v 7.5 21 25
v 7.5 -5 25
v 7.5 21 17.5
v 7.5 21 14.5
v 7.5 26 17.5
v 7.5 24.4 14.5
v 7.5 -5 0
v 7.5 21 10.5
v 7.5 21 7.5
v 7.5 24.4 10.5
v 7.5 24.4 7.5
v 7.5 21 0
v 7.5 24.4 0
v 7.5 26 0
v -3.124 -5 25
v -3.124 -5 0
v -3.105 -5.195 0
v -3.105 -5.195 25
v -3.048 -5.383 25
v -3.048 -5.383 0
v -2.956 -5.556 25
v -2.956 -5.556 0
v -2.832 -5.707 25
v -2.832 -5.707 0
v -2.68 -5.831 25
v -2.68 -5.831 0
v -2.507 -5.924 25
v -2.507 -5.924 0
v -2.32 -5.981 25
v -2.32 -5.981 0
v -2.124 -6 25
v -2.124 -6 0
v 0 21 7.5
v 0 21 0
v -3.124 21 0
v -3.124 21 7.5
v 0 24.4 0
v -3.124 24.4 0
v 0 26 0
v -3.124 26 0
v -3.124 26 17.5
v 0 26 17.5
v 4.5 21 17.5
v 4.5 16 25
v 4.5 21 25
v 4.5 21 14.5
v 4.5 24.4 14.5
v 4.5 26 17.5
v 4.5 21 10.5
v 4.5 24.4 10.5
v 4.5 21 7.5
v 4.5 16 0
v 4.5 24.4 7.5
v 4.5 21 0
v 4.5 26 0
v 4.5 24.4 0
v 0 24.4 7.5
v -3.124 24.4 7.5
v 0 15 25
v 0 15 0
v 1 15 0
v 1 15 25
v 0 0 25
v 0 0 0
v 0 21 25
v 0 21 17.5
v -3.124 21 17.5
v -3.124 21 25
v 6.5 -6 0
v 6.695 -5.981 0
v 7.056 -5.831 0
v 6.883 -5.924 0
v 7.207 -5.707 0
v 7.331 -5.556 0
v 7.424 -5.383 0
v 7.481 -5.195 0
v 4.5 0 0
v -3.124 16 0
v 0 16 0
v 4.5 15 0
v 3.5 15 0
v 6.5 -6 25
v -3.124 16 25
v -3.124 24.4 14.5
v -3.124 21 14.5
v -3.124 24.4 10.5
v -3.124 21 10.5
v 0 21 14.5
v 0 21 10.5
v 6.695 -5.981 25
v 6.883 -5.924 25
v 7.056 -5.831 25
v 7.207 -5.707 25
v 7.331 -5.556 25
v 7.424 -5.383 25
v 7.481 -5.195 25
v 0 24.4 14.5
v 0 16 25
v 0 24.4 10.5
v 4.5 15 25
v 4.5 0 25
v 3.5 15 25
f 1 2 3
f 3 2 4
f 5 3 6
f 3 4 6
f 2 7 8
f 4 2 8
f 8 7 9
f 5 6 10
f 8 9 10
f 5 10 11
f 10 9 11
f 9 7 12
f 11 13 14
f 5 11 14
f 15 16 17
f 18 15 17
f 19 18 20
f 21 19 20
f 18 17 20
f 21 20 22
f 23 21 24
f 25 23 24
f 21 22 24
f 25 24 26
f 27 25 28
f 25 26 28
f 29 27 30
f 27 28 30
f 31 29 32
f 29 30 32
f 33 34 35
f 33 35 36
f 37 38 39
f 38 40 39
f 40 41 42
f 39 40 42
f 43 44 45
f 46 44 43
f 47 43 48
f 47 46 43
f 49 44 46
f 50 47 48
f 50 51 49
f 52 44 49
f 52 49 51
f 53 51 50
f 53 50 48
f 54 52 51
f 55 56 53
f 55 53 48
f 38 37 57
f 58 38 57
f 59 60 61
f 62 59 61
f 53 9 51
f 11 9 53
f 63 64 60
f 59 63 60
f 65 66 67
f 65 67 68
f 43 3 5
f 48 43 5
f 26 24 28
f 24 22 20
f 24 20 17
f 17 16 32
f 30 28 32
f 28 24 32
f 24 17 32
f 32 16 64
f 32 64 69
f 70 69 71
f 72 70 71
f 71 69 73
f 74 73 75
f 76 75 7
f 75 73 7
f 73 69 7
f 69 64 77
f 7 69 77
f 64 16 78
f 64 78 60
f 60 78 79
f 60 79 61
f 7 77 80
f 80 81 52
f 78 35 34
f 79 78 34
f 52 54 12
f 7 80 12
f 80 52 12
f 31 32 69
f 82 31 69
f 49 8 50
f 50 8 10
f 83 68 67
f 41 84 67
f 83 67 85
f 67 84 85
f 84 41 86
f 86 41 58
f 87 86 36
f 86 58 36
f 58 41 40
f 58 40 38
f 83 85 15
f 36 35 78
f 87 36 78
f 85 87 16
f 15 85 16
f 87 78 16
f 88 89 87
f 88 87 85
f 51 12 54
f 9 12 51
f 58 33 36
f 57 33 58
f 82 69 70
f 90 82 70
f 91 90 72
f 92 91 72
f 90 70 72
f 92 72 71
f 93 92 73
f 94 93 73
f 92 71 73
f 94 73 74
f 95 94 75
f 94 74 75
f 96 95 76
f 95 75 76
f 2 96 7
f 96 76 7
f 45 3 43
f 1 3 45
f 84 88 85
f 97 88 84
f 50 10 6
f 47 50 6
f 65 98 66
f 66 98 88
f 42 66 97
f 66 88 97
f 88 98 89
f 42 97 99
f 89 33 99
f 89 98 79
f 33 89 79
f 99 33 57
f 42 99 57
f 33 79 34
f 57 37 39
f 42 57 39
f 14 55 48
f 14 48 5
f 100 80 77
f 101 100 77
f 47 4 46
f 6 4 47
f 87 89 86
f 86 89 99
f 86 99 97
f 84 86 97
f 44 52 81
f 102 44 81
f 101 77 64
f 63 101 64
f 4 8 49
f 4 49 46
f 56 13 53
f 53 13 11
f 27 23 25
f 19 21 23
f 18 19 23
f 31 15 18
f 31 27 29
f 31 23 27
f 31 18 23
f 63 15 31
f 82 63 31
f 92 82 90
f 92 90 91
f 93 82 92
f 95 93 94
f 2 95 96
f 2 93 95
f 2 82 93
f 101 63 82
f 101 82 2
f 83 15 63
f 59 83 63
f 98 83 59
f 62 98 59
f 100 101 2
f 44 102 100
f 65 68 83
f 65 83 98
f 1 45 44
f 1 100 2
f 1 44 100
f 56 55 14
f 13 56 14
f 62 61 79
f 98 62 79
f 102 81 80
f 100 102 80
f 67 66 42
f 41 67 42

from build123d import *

# Parameters (mm, degrees)
F1_DEPTH = 25
F0_W     = 3.1244163401
F0_H     = 10
F0_W_2   = 3
F2_DEPTH = 25
F3_W     = 3.4
F3_H     = 4
F3_W_2   = 5
F3_H_2   = 7.5
F4_DEPTH = 25


# Not quite as in the source:
# - a feature names something its author has since deleted; it is built from what else it names


with BuildPart() as f1:
    # F0 (on Top) → F1 (new body)
    with BuildSketch(Plane.XY):
        with BuildLine():
            Line((4.5, 0), (0, 0))
            Line((0, 0), (0, 15))
            Line((0, 15), (1, 15))
            Line((1, 15), (0, 16))
            Line((0, 16), (-3.1244163401, 16))
            Line((-3.1244163401, 16), (-3.1244163401, 15))
            Line((-3.1244163401, 15), (-3.1244163401, 0))
            Line((-3.1244163401, 0), (-3.1244163401, -5))
            ThreePointArc((-3.1244163401, -5), (-2.8315231213, -5.7071067812), (-2.1244163401, -6))
            Line((-2.1244163401, -6), (4.5, -6))
            Line((4.5, -6), (6.5, -6))
            ThreePointArc((6.5, -6), (7.2071067812, -5.7071067812), (7.5, -5))
            Line((7.5, -5), (7.5, 15))
            Line((7.5, 15), (7.5, 16))
            Line((7.5, 16), (4.5, 16))
            Line((4.5, 16), (3.5, 15))
            Line((3.5, 15), (4.5, 15))
            Line((4.5, 15), (4.5, 0))
        make_face()
    extrude(amount=F1_DEPTH)

    # F0 (on Top) → F2 (join)
    with BuildSketch(Plane.XY):
        with BuildLine():
            Line((4.5, 0), (0, 0))
            Line((0, 0), (0, 15))
            Line((0, 15), (1, 15))
            Line((1, 15), (0, 16))
            Line((0, 16), (-3.1244163401, 16))
            Line((-3.1244163401, 16), (-3.1244163401, 15))
            Line((-3.1244163401, 15), (-3.1244163401, 0))
            Line((-3.1244163401, 0), (-3.1244163401, -5))
            ThreePointArc((-3.1244163401, -5), (-2.8315231213, -5.7071067812), (-2.1244163401, -6))
            Line((-2.1244163401, -6), (4.5, -6))
            Line((4.5, -6), (6.5, -6))
            ThreePointArc((6.5, -6), (7.2071067812, -5.7071067812), (7.5, -5))
            Line((7.5, -5), (7.5, 15))
            Line((7.5, 15), (7.5, 16))
            Line((7.5, 16), (4.5, 16))
            Line((4.5, 16), (3.5, 15))
            Line((3.5, 15), (4.5, 15))
            Line((4.5, 15), (4.5, 0))
        make_face()
        with Locations((-1.5622081701, 21)):
            Rectangle(F0_W, F0_H)
        with Locations((6, 21)):
            Rectangle(F0_W_2, F0_H)
    extrude(amount=F2_DEPTH)

    # F3 (on face) → F4 (cut)
    with BuildSketch(Plane.YZ.offset(7.5)):
        with Locations((22.7, 12.5)):
            Rectangle(F3_W, F3_H)
        with Locations((23.5, 21.25)):
            Rectangle(F3_W_2, F3_H_2)
        with Locations((22.7, 3.75)):
            Rectangle(F3_W, F3_H_2)
    extrude(amount=-F4_DEPTH, mode=Mode.SUBTRACT)


solid = f1.part
